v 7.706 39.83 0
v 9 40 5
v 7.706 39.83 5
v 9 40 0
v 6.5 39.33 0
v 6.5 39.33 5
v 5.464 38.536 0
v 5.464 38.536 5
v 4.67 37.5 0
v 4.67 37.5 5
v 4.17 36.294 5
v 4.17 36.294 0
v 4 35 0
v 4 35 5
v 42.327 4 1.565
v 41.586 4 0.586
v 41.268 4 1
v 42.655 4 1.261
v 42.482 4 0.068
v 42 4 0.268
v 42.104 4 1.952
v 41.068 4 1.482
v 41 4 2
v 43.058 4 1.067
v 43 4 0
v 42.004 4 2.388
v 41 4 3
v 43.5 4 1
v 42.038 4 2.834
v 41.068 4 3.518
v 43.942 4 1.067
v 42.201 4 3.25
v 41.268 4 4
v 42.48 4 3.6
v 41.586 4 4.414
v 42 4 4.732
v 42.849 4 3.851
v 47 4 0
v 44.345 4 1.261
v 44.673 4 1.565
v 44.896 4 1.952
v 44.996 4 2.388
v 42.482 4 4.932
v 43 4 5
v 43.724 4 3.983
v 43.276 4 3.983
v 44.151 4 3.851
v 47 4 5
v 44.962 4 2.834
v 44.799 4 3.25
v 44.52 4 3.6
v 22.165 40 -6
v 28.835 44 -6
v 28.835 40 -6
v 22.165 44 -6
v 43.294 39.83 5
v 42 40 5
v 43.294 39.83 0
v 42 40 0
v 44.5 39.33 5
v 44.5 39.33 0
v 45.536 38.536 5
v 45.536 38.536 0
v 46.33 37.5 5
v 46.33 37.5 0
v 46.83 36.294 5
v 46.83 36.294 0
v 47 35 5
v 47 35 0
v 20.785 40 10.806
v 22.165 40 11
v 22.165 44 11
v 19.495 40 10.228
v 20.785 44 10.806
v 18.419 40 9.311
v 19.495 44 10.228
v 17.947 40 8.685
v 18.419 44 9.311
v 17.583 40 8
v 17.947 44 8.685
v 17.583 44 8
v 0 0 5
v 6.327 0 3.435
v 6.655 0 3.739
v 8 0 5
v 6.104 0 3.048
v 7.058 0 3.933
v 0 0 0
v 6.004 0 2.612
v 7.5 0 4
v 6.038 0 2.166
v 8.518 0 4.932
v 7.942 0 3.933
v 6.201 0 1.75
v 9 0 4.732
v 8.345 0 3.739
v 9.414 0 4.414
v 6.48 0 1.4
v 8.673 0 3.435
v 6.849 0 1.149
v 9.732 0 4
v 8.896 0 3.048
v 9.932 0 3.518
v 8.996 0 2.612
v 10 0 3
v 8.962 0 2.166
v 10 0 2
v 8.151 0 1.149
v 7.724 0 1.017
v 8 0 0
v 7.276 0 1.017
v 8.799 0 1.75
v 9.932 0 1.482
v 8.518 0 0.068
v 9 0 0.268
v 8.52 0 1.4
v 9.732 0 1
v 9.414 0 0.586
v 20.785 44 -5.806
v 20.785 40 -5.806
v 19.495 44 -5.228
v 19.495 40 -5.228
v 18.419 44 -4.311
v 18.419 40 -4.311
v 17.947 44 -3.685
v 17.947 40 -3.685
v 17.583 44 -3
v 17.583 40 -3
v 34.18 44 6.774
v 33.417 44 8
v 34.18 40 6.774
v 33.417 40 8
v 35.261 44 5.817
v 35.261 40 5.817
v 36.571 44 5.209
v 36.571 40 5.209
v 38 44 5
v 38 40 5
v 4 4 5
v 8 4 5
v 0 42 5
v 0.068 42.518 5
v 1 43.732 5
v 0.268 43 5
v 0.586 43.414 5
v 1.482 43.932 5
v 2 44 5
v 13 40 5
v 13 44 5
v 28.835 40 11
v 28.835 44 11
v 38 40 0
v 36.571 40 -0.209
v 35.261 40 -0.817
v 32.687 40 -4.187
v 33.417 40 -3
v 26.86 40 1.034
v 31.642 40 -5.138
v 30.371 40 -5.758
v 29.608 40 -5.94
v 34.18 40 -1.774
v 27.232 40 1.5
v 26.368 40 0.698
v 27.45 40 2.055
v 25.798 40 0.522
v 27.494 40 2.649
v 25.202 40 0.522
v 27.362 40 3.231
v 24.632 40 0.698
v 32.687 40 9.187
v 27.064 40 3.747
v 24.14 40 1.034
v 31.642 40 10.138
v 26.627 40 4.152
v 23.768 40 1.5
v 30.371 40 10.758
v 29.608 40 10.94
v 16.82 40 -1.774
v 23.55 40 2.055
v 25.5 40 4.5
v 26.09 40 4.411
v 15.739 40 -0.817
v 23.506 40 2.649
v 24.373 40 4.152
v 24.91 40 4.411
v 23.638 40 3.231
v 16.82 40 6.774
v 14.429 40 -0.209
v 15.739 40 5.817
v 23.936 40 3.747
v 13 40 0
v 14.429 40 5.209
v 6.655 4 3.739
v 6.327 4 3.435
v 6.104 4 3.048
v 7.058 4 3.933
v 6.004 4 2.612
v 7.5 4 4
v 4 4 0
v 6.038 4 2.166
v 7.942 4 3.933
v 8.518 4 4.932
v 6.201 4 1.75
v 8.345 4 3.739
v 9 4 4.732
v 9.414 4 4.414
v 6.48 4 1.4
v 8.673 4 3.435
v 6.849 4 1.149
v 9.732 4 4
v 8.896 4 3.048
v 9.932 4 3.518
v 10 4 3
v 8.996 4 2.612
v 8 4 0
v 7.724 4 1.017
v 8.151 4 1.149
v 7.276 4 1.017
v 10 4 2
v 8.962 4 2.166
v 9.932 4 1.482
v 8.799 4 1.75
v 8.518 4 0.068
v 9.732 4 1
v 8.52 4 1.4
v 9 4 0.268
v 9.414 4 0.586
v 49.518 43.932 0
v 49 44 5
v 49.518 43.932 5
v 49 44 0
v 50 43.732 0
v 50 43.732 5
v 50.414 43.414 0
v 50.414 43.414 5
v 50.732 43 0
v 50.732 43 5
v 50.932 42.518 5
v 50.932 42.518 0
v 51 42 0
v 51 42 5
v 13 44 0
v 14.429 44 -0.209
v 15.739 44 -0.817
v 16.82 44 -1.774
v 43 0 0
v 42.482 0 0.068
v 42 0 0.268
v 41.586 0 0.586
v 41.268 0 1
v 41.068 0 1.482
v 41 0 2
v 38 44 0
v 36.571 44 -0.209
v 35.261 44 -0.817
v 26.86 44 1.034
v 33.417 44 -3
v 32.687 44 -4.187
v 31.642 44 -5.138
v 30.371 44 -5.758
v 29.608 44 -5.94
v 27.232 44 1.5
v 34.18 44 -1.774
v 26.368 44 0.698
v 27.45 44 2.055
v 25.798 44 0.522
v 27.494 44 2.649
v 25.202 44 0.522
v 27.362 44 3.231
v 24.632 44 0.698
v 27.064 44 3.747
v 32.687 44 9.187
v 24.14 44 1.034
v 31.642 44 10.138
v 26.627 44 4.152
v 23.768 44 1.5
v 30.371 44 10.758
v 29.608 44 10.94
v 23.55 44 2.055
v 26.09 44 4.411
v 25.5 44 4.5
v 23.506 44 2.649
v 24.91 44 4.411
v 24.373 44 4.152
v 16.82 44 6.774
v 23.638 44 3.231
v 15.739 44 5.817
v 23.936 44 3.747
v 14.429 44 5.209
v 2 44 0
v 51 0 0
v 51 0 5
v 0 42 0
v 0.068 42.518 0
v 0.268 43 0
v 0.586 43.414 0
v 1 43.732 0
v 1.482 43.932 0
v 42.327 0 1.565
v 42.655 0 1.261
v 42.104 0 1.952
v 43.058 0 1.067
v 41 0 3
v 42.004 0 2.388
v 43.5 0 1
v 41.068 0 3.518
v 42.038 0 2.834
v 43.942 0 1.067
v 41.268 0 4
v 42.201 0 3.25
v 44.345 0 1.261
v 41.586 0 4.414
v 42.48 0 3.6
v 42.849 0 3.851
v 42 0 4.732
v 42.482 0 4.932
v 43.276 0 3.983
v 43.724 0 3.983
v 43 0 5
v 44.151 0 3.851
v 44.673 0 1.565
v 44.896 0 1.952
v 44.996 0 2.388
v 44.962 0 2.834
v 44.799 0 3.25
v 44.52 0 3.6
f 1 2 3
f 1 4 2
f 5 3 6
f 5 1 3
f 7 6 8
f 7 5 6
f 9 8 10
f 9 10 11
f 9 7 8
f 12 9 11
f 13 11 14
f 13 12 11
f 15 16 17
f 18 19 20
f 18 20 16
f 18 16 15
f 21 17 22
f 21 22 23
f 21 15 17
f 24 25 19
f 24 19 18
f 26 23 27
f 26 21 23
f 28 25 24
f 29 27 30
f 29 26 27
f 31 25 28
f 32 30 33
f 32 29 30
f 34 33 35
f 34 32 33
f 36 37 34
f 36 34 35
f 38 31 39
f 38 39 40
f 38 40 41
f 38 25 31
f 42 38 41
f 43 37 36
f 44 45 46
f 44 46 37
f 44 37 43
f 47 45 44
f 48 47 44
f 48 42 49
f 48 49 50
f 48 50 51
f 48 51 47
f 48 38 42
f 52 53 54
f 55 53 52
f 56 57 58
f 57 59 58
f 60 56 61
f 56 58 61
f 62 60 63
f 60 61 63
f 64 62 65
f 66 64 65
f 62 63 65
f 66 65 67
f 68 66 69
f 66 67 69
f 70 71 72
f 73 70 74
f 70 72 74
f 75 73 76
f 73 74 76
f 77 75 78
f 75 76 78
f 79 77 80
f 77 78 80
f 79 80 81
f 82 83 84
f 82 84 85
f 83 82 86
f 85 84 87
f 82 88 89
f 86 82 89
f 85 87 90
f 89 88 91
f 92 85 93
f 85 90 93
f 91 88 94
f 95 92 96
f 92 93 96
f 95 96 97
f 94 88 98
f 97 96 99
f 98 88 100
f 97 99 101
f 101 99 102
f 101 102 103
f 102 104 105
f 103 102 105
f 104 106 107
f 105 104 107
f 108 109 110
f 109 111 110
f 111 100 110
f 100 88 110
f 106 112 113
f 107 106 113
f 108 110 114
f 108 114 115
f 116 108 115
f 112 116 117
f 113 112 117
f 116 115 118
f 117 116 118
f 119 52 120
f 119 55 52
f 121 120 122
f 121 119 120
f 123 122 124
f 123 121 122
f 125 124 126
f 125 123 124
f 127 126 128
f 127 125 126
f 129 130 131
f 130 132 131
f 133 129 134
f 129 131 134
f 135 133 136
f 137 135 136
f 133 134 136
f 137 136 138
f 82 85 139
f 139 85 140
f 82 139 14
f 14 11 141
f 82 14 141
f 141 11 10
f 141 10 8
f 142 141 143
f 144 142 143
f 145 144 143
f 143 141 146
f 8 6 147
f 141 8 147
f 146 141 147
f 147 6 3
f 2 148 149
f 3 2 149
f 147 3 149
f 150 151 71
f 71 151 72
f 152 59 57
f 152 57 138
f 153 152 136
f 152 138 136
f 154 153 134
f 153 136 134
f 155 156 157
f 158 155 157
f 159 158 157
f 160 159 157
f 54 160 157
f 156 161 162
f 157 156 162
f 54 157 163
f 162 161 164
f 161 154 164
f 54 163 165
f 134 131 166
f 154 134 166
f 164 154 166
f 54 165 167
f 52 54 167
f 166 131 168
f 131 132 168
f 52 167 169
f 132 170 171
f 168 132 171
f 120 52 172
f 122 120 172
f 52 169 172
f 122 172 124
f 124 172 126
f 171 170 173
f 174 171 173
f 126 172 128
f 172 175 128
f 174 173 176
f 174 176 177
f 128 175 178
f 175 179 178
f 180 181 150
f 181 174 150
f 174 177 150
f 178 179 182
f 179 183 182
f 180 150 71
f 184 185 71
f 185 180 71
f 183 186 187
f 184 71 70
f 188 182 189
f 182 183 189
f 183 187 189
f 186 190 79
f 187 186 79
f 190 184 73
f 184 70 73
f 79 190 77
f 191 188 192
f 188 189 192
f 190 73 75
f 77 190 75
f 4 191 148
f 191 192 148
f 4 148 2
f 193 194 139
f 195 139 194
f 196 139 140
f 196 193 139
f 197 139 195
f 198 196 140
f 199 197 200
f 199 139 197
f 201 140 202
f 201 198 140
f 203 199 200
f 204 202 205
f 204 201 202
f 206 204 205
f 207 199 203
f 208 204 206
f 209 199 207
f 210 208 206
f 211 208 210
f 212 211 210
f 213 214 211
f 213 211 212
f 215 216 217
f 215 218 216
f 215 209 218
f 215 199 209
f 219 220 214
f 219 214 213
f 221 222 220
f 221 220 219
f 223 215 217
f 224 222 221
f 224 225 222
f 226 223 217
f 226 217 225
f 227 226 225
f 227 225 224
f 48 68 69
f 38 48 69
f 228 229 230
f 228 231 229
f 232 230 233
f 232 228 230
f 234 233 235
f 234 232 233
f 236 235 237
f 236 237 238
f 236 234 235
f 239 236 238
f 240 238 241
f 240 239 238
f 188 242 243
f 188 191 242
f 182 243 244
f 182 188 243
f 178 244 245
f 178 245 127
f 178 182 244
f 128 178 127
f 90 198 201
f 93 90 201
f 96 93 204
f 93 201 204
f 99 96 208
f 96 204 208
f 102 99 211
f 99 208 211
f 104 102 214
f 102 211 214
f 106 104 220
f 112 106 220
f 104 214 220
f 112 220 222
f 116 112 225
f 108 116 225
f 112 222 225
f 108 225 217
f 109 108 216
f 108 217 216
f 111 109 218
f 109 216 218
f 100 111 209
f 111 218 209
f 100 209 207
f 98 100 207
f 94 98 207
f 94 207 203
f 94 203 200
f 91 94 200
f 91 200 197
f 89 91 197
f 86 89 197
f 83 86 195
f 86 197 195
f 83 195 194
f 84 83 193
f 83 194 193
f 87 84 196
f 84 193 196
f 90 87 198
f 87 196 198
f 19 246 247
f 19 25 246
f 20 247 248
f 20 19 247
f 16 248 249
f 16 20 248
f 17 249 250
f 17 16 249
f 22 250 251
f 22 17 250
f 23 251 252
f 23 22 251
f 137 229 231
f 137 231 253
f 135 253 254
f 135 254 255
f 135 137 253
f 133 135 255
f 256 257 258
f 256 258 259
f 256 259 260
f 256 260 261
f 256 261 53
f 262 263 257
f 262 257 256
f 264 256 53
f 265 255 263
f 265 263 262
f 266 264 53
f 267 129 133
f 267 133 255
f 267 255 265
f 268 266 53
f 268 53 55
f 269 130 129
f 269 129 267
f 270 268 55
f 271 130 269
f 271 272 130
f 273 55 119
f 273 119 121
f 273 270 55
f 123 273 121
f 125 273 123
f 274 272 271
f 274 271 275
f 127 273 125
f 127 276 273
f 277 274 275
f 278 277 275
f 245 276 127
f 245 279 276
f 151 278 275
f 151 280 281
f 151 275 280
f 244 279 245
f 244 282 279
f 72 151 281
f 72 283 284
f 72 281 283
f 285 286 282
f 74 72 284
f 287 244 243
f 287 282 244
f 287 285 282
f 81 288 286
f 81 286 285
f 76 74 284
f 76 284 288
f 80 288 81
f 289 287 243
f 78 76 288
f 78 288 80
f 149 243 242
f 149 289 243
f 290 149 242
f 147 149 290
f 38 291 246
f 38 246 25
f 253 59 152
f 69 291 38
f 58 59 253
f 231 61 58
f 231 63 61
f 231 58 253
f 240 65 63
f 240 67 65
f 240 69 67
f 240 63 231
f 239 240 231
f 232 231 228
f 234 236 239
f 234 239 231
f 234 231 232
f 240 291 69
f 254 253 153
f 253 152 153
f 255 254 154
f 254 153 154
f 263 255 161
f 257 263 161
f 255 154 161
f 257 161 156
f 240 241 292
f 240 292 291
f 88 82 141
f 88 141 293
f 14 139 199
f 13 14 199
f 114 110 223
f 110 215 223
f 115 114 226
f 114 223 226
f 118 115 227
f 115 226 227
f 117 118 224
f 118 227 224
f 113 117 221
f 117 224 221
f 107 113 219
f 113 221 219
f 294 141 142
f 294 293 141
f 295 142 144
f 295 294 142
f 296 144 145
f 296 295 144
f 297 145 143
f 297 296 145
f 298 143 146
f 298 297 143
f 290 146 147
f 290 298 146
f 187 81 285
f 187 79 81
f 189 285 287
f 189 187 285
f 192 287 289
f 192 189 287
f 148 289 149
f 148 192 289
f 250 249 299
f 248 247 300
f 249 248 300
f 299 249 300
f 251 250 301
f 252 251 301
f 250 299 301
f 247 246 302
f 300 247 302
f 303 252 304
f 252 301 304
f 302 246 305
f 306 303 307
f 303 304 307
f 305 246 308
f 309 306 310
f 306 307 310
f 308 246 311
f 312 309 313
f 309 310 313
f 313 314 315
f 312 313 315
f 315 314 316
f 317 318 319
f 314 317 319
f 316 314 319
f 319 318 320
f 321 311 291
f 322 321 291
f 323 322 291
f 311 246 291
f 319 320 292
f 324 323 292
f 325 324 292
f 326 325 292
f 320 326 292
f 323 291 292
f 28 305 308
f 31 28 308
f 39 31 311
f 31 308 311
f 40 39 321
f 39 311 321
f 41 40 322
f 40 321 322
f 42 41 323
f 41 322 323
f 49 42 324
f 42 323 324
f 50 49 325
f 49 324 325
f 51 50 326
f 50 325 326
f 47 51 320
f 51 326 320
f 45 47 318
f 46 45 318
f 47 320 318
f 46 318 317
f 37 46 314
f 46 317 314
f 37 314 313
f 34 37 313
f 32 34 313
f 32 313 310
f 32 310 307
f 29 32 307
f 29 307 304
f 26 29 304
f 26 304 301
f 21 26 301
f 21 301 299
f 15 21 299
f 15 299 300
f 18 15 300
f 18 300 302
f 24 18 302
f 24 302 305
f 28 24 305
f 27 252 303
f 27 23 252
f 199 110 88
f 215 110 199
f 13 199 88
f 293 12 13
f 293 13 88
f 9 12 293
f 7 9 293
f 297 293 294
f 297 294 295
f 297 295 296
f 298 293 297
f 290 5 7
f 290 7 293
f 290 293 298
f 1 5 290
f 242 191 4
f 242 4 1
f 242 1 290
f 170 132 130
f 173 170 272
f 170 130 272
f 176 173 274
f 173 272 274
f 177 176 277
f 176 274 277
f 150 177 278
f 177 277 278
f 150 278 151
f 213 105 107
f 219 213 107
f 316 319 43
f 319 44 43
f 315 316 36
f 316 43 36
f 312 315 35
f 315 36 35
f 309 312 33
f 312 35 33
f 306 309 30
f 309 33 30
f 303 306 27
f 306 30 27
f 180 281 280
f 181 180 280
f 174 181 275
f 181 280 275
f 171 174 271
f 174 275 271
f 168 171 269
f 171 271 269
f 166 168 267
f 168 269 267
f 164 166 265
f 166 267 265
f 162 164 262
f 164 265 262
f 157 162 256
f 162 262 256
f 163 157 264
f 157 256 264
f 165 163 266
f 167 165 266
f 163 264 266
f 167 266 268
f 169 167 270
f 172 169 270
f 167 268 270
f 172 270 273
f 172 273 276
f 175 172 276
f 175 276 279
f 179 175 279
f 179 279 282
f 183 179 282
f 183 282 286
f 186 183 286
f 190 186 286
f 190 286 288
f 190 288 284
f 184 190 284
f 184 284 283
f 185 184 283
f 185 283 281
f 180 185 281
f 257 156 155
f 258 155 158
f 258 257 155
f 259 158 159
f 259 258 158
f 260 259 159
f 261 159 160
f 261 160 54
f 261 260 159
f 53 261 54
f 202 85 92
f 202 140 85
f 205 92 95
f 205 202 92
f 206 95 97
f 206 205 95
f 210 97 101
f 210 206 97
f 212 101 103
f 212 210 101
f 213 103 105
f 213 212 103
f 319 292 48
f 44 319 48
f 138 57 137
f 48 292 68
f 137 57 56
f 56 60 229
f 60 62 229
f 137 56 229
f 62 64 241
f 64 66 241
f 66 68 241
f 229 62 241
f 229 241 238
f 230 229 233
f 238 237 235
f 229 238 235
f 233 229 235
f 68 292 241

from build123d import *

# Parameters (mm, degrees)
SKETCH_1_W           = 10
SKETCH_1_H           = 5
EXTRUDE_1_DEPTH      = 4
SKETCH_3_R           = 1.5
CUT_EXTRUDE_1_DEPTH  = 4
SKETCH_4_W           = 4
SKETCH_4_H           = 5
EXTRUDE_2_DEPTH      = 40
SKETCH_5_W           = 5
SKETCH_5_H           = 4
EXTRUDE_3_DEPTH      = 47
SKETCH_7_W           = 4
SKETCH_7_H           = 5
EXTRUDE_4_DEPTH      = 40
SKETCH_8_W           = 5
SKETCH_8_H           = 4
EXTRUDE_5_DEPTH      = 6
SKETCH_10_R          = 1.5
CUT_EXTRUDE_2_DEPTH  = 6
EXTRUDE_6_DEPTH      = 6
EXTRUDE_6_DEPTH_BACK = 11
SKETCH_11_W          = 15
SKETCH_11_H          = 4
FILLET_1_R           = 5
SKETCH_12_R          = 2
CUT_EXTRUDE_3_DEPTH  = 6
FILLET_2_R           = 5
FILLET_3_R           = 5
FILLET_4_R           = 2
FILLET_5_R           = 2


with BuildPart() as part:
    # 草图1 → 凸台-拉伸1 (new body)
    with BuildSketch(Plane(origin=(0, 0, 0), x_dir=(1, 0, 0), z_dir=(0, 1, 0))):
        with Locations((5, -2.5)):
            Rectangle(SKETCH_1_W, SKETCH_1_H)
    extrude(amount=EXTRUDE_1_DEPTH)

    # 草图3 → 切除-拉伸1 (cut)
    with BuildSketch(Plane(origin=(0, 4, 0), x_dir=(1, 0, 0), z_dir=(0, 1, 0))):
        with Locations(Location((7.5, -2.5, 0), (0, 0, 270))):
            Circle(SKETCH_3_R)
    extrude(amount=-CUT_EXTRUDE_1_DEPTH, mode=Mode.SUBTRACT)

    # 草图4 → 凸台-拉伸2 (add)
    with BuildSketch(Plane(origin=(0, 4, 0), x_dir=(1, 0, 0), z_dir=(0, 1, 0))):
        with Locations((2, -2.5)):
            Rectangle(SKETCH_4_W, SKETCH_4_H)
    extrude(amount=EXTRUDE_2_DEPTH)

    # 草图5 → 凸台-拉伸3 (add)
    with BuildSketch(Plane(origin=(4, 0, 0), x_dir=(0, 0, -1), z_dir=(1, 0, 0))):
        with Locations((-2.5, 42)):
            Rectangle(SKETCH_5_W, SKETCH_5_H)
    extrude(amount=EXTRUDE_3_DEPTH)

    # 草图7 → 凸台-拉伸4 (add)
    with BuildSketch(Plane(origin=(0, 40, 0), x_dir=(-1, 0, 0), z_dir=(0, -1, 0))):
        with Locations((-49, -2.5)):
            Rectangle(SKETCH_7_W, SKETCH_7_H)
    extrude(amount=EXTRUDE_4_DEPTH)

    # 草图8 → 凸台-拉伸5 (add)
    with BuildSketch(Plane.ZY.offset(-47)):
        with Locations((2.5, 2)):
            Rectangle(SKETCH_8_W, SKETCH_8_H)
    extrude(amount=EXTRUDE_5_DEPTH)

    # 草图10 → 切除-拉伸2 (cut)
    with BuildSketch(Plane(origin=(0, 0, 0), x_dir=(-1, 0, 0), z_dir=(0, -1, 0))):
        with Locations(Location((-43.5, -2.5, 0), (0, 0, 90))):
            Circle(SKETCH_10_R)
    extrude(amount=-CUT_EXTRUDE_2_DEPTH, mode=Mode.SUBTRACT)

    # 草图11 → 凸台-拉伸6 (add, two sides: drawn at the far end of the back side and taken through both)
    with BuildSketch(Plane(origin=(0, 0, 0), x_dir=(-1, 0, 0), z_dir=(0, 0, -1)).offset(-EXTRUDE_6_DEPTH_BACK)):
        with Locations((-25.5, 42)):
            Rectangle(SKETCH_11_W, SKETCH_11_H)
    extrude(amount=EXTRUDE_6_DEPTH + EXTRUDE_6_DEPTH_BACK)

    # 圆角1
    fillet_1_edges = [part.edges().sort_by_distance(p)[0] for p in [
        (33, 42, 5),
        (33, 42, 0),
        (18, 42, 5),
        (18, 42, 0),
    ]]
    fillet(fillet_1_edges, radius=FILLET_1_R)

    # 草图12 → 切除-拉伸3 (cut)
    with BuildSketch(Plane(origin=(0, 44, 0), x_dir=(1, 0, 0), z_dir=(0, 1, 0))):
        with Locations(Location((25.5, -2.5, 0), (0, 0, 270))):
            Circle(SKETCH_12_R)
    extrude(amount=-CUT_EXTRUDE_3_DEPTH, mode=Mode.SUBTRACT)

    # 圆角2
    fillet_2_edges = [part.edges().sort_by_distance(p)[0] for p in [
        (18, 42, -6),
        (33, 42, -6),
        (33, 42, 11),
        (18, 42, 11),
    ]]
    fillet(fillet_2_edges, radius=FILLET_2_R)

    # 圆角3
    fillet_3_edges = [part.edges().sort_by_distance(p)[0] for p in [
        (4, 40, 2.5),
        (47, 40, 2.5),
    ]]
    fillet(fillet_3_edges, radius=FILLET_3_R)

    # 圆角4
    fillet_4_edges = [part.edges().sort_by_distance(p)[0] for p in [
        (10, 2, 0),
        (10, 2, 5),
    ]]
    fillet(fillet_4_edges, radius=FILLET_4_R)

    # 圆角5
    fillet_5_edges = [part.edges().sort_by_distance(p)[0] for p in [
        (0, 44, 2.5),
        (51, 44, 2.5),
        (41, 2, 0),
        (41, 2, 5),
    ]]
    fillet(fillet_5_edges, radius=FILLET_5_R)


solid = part.part
